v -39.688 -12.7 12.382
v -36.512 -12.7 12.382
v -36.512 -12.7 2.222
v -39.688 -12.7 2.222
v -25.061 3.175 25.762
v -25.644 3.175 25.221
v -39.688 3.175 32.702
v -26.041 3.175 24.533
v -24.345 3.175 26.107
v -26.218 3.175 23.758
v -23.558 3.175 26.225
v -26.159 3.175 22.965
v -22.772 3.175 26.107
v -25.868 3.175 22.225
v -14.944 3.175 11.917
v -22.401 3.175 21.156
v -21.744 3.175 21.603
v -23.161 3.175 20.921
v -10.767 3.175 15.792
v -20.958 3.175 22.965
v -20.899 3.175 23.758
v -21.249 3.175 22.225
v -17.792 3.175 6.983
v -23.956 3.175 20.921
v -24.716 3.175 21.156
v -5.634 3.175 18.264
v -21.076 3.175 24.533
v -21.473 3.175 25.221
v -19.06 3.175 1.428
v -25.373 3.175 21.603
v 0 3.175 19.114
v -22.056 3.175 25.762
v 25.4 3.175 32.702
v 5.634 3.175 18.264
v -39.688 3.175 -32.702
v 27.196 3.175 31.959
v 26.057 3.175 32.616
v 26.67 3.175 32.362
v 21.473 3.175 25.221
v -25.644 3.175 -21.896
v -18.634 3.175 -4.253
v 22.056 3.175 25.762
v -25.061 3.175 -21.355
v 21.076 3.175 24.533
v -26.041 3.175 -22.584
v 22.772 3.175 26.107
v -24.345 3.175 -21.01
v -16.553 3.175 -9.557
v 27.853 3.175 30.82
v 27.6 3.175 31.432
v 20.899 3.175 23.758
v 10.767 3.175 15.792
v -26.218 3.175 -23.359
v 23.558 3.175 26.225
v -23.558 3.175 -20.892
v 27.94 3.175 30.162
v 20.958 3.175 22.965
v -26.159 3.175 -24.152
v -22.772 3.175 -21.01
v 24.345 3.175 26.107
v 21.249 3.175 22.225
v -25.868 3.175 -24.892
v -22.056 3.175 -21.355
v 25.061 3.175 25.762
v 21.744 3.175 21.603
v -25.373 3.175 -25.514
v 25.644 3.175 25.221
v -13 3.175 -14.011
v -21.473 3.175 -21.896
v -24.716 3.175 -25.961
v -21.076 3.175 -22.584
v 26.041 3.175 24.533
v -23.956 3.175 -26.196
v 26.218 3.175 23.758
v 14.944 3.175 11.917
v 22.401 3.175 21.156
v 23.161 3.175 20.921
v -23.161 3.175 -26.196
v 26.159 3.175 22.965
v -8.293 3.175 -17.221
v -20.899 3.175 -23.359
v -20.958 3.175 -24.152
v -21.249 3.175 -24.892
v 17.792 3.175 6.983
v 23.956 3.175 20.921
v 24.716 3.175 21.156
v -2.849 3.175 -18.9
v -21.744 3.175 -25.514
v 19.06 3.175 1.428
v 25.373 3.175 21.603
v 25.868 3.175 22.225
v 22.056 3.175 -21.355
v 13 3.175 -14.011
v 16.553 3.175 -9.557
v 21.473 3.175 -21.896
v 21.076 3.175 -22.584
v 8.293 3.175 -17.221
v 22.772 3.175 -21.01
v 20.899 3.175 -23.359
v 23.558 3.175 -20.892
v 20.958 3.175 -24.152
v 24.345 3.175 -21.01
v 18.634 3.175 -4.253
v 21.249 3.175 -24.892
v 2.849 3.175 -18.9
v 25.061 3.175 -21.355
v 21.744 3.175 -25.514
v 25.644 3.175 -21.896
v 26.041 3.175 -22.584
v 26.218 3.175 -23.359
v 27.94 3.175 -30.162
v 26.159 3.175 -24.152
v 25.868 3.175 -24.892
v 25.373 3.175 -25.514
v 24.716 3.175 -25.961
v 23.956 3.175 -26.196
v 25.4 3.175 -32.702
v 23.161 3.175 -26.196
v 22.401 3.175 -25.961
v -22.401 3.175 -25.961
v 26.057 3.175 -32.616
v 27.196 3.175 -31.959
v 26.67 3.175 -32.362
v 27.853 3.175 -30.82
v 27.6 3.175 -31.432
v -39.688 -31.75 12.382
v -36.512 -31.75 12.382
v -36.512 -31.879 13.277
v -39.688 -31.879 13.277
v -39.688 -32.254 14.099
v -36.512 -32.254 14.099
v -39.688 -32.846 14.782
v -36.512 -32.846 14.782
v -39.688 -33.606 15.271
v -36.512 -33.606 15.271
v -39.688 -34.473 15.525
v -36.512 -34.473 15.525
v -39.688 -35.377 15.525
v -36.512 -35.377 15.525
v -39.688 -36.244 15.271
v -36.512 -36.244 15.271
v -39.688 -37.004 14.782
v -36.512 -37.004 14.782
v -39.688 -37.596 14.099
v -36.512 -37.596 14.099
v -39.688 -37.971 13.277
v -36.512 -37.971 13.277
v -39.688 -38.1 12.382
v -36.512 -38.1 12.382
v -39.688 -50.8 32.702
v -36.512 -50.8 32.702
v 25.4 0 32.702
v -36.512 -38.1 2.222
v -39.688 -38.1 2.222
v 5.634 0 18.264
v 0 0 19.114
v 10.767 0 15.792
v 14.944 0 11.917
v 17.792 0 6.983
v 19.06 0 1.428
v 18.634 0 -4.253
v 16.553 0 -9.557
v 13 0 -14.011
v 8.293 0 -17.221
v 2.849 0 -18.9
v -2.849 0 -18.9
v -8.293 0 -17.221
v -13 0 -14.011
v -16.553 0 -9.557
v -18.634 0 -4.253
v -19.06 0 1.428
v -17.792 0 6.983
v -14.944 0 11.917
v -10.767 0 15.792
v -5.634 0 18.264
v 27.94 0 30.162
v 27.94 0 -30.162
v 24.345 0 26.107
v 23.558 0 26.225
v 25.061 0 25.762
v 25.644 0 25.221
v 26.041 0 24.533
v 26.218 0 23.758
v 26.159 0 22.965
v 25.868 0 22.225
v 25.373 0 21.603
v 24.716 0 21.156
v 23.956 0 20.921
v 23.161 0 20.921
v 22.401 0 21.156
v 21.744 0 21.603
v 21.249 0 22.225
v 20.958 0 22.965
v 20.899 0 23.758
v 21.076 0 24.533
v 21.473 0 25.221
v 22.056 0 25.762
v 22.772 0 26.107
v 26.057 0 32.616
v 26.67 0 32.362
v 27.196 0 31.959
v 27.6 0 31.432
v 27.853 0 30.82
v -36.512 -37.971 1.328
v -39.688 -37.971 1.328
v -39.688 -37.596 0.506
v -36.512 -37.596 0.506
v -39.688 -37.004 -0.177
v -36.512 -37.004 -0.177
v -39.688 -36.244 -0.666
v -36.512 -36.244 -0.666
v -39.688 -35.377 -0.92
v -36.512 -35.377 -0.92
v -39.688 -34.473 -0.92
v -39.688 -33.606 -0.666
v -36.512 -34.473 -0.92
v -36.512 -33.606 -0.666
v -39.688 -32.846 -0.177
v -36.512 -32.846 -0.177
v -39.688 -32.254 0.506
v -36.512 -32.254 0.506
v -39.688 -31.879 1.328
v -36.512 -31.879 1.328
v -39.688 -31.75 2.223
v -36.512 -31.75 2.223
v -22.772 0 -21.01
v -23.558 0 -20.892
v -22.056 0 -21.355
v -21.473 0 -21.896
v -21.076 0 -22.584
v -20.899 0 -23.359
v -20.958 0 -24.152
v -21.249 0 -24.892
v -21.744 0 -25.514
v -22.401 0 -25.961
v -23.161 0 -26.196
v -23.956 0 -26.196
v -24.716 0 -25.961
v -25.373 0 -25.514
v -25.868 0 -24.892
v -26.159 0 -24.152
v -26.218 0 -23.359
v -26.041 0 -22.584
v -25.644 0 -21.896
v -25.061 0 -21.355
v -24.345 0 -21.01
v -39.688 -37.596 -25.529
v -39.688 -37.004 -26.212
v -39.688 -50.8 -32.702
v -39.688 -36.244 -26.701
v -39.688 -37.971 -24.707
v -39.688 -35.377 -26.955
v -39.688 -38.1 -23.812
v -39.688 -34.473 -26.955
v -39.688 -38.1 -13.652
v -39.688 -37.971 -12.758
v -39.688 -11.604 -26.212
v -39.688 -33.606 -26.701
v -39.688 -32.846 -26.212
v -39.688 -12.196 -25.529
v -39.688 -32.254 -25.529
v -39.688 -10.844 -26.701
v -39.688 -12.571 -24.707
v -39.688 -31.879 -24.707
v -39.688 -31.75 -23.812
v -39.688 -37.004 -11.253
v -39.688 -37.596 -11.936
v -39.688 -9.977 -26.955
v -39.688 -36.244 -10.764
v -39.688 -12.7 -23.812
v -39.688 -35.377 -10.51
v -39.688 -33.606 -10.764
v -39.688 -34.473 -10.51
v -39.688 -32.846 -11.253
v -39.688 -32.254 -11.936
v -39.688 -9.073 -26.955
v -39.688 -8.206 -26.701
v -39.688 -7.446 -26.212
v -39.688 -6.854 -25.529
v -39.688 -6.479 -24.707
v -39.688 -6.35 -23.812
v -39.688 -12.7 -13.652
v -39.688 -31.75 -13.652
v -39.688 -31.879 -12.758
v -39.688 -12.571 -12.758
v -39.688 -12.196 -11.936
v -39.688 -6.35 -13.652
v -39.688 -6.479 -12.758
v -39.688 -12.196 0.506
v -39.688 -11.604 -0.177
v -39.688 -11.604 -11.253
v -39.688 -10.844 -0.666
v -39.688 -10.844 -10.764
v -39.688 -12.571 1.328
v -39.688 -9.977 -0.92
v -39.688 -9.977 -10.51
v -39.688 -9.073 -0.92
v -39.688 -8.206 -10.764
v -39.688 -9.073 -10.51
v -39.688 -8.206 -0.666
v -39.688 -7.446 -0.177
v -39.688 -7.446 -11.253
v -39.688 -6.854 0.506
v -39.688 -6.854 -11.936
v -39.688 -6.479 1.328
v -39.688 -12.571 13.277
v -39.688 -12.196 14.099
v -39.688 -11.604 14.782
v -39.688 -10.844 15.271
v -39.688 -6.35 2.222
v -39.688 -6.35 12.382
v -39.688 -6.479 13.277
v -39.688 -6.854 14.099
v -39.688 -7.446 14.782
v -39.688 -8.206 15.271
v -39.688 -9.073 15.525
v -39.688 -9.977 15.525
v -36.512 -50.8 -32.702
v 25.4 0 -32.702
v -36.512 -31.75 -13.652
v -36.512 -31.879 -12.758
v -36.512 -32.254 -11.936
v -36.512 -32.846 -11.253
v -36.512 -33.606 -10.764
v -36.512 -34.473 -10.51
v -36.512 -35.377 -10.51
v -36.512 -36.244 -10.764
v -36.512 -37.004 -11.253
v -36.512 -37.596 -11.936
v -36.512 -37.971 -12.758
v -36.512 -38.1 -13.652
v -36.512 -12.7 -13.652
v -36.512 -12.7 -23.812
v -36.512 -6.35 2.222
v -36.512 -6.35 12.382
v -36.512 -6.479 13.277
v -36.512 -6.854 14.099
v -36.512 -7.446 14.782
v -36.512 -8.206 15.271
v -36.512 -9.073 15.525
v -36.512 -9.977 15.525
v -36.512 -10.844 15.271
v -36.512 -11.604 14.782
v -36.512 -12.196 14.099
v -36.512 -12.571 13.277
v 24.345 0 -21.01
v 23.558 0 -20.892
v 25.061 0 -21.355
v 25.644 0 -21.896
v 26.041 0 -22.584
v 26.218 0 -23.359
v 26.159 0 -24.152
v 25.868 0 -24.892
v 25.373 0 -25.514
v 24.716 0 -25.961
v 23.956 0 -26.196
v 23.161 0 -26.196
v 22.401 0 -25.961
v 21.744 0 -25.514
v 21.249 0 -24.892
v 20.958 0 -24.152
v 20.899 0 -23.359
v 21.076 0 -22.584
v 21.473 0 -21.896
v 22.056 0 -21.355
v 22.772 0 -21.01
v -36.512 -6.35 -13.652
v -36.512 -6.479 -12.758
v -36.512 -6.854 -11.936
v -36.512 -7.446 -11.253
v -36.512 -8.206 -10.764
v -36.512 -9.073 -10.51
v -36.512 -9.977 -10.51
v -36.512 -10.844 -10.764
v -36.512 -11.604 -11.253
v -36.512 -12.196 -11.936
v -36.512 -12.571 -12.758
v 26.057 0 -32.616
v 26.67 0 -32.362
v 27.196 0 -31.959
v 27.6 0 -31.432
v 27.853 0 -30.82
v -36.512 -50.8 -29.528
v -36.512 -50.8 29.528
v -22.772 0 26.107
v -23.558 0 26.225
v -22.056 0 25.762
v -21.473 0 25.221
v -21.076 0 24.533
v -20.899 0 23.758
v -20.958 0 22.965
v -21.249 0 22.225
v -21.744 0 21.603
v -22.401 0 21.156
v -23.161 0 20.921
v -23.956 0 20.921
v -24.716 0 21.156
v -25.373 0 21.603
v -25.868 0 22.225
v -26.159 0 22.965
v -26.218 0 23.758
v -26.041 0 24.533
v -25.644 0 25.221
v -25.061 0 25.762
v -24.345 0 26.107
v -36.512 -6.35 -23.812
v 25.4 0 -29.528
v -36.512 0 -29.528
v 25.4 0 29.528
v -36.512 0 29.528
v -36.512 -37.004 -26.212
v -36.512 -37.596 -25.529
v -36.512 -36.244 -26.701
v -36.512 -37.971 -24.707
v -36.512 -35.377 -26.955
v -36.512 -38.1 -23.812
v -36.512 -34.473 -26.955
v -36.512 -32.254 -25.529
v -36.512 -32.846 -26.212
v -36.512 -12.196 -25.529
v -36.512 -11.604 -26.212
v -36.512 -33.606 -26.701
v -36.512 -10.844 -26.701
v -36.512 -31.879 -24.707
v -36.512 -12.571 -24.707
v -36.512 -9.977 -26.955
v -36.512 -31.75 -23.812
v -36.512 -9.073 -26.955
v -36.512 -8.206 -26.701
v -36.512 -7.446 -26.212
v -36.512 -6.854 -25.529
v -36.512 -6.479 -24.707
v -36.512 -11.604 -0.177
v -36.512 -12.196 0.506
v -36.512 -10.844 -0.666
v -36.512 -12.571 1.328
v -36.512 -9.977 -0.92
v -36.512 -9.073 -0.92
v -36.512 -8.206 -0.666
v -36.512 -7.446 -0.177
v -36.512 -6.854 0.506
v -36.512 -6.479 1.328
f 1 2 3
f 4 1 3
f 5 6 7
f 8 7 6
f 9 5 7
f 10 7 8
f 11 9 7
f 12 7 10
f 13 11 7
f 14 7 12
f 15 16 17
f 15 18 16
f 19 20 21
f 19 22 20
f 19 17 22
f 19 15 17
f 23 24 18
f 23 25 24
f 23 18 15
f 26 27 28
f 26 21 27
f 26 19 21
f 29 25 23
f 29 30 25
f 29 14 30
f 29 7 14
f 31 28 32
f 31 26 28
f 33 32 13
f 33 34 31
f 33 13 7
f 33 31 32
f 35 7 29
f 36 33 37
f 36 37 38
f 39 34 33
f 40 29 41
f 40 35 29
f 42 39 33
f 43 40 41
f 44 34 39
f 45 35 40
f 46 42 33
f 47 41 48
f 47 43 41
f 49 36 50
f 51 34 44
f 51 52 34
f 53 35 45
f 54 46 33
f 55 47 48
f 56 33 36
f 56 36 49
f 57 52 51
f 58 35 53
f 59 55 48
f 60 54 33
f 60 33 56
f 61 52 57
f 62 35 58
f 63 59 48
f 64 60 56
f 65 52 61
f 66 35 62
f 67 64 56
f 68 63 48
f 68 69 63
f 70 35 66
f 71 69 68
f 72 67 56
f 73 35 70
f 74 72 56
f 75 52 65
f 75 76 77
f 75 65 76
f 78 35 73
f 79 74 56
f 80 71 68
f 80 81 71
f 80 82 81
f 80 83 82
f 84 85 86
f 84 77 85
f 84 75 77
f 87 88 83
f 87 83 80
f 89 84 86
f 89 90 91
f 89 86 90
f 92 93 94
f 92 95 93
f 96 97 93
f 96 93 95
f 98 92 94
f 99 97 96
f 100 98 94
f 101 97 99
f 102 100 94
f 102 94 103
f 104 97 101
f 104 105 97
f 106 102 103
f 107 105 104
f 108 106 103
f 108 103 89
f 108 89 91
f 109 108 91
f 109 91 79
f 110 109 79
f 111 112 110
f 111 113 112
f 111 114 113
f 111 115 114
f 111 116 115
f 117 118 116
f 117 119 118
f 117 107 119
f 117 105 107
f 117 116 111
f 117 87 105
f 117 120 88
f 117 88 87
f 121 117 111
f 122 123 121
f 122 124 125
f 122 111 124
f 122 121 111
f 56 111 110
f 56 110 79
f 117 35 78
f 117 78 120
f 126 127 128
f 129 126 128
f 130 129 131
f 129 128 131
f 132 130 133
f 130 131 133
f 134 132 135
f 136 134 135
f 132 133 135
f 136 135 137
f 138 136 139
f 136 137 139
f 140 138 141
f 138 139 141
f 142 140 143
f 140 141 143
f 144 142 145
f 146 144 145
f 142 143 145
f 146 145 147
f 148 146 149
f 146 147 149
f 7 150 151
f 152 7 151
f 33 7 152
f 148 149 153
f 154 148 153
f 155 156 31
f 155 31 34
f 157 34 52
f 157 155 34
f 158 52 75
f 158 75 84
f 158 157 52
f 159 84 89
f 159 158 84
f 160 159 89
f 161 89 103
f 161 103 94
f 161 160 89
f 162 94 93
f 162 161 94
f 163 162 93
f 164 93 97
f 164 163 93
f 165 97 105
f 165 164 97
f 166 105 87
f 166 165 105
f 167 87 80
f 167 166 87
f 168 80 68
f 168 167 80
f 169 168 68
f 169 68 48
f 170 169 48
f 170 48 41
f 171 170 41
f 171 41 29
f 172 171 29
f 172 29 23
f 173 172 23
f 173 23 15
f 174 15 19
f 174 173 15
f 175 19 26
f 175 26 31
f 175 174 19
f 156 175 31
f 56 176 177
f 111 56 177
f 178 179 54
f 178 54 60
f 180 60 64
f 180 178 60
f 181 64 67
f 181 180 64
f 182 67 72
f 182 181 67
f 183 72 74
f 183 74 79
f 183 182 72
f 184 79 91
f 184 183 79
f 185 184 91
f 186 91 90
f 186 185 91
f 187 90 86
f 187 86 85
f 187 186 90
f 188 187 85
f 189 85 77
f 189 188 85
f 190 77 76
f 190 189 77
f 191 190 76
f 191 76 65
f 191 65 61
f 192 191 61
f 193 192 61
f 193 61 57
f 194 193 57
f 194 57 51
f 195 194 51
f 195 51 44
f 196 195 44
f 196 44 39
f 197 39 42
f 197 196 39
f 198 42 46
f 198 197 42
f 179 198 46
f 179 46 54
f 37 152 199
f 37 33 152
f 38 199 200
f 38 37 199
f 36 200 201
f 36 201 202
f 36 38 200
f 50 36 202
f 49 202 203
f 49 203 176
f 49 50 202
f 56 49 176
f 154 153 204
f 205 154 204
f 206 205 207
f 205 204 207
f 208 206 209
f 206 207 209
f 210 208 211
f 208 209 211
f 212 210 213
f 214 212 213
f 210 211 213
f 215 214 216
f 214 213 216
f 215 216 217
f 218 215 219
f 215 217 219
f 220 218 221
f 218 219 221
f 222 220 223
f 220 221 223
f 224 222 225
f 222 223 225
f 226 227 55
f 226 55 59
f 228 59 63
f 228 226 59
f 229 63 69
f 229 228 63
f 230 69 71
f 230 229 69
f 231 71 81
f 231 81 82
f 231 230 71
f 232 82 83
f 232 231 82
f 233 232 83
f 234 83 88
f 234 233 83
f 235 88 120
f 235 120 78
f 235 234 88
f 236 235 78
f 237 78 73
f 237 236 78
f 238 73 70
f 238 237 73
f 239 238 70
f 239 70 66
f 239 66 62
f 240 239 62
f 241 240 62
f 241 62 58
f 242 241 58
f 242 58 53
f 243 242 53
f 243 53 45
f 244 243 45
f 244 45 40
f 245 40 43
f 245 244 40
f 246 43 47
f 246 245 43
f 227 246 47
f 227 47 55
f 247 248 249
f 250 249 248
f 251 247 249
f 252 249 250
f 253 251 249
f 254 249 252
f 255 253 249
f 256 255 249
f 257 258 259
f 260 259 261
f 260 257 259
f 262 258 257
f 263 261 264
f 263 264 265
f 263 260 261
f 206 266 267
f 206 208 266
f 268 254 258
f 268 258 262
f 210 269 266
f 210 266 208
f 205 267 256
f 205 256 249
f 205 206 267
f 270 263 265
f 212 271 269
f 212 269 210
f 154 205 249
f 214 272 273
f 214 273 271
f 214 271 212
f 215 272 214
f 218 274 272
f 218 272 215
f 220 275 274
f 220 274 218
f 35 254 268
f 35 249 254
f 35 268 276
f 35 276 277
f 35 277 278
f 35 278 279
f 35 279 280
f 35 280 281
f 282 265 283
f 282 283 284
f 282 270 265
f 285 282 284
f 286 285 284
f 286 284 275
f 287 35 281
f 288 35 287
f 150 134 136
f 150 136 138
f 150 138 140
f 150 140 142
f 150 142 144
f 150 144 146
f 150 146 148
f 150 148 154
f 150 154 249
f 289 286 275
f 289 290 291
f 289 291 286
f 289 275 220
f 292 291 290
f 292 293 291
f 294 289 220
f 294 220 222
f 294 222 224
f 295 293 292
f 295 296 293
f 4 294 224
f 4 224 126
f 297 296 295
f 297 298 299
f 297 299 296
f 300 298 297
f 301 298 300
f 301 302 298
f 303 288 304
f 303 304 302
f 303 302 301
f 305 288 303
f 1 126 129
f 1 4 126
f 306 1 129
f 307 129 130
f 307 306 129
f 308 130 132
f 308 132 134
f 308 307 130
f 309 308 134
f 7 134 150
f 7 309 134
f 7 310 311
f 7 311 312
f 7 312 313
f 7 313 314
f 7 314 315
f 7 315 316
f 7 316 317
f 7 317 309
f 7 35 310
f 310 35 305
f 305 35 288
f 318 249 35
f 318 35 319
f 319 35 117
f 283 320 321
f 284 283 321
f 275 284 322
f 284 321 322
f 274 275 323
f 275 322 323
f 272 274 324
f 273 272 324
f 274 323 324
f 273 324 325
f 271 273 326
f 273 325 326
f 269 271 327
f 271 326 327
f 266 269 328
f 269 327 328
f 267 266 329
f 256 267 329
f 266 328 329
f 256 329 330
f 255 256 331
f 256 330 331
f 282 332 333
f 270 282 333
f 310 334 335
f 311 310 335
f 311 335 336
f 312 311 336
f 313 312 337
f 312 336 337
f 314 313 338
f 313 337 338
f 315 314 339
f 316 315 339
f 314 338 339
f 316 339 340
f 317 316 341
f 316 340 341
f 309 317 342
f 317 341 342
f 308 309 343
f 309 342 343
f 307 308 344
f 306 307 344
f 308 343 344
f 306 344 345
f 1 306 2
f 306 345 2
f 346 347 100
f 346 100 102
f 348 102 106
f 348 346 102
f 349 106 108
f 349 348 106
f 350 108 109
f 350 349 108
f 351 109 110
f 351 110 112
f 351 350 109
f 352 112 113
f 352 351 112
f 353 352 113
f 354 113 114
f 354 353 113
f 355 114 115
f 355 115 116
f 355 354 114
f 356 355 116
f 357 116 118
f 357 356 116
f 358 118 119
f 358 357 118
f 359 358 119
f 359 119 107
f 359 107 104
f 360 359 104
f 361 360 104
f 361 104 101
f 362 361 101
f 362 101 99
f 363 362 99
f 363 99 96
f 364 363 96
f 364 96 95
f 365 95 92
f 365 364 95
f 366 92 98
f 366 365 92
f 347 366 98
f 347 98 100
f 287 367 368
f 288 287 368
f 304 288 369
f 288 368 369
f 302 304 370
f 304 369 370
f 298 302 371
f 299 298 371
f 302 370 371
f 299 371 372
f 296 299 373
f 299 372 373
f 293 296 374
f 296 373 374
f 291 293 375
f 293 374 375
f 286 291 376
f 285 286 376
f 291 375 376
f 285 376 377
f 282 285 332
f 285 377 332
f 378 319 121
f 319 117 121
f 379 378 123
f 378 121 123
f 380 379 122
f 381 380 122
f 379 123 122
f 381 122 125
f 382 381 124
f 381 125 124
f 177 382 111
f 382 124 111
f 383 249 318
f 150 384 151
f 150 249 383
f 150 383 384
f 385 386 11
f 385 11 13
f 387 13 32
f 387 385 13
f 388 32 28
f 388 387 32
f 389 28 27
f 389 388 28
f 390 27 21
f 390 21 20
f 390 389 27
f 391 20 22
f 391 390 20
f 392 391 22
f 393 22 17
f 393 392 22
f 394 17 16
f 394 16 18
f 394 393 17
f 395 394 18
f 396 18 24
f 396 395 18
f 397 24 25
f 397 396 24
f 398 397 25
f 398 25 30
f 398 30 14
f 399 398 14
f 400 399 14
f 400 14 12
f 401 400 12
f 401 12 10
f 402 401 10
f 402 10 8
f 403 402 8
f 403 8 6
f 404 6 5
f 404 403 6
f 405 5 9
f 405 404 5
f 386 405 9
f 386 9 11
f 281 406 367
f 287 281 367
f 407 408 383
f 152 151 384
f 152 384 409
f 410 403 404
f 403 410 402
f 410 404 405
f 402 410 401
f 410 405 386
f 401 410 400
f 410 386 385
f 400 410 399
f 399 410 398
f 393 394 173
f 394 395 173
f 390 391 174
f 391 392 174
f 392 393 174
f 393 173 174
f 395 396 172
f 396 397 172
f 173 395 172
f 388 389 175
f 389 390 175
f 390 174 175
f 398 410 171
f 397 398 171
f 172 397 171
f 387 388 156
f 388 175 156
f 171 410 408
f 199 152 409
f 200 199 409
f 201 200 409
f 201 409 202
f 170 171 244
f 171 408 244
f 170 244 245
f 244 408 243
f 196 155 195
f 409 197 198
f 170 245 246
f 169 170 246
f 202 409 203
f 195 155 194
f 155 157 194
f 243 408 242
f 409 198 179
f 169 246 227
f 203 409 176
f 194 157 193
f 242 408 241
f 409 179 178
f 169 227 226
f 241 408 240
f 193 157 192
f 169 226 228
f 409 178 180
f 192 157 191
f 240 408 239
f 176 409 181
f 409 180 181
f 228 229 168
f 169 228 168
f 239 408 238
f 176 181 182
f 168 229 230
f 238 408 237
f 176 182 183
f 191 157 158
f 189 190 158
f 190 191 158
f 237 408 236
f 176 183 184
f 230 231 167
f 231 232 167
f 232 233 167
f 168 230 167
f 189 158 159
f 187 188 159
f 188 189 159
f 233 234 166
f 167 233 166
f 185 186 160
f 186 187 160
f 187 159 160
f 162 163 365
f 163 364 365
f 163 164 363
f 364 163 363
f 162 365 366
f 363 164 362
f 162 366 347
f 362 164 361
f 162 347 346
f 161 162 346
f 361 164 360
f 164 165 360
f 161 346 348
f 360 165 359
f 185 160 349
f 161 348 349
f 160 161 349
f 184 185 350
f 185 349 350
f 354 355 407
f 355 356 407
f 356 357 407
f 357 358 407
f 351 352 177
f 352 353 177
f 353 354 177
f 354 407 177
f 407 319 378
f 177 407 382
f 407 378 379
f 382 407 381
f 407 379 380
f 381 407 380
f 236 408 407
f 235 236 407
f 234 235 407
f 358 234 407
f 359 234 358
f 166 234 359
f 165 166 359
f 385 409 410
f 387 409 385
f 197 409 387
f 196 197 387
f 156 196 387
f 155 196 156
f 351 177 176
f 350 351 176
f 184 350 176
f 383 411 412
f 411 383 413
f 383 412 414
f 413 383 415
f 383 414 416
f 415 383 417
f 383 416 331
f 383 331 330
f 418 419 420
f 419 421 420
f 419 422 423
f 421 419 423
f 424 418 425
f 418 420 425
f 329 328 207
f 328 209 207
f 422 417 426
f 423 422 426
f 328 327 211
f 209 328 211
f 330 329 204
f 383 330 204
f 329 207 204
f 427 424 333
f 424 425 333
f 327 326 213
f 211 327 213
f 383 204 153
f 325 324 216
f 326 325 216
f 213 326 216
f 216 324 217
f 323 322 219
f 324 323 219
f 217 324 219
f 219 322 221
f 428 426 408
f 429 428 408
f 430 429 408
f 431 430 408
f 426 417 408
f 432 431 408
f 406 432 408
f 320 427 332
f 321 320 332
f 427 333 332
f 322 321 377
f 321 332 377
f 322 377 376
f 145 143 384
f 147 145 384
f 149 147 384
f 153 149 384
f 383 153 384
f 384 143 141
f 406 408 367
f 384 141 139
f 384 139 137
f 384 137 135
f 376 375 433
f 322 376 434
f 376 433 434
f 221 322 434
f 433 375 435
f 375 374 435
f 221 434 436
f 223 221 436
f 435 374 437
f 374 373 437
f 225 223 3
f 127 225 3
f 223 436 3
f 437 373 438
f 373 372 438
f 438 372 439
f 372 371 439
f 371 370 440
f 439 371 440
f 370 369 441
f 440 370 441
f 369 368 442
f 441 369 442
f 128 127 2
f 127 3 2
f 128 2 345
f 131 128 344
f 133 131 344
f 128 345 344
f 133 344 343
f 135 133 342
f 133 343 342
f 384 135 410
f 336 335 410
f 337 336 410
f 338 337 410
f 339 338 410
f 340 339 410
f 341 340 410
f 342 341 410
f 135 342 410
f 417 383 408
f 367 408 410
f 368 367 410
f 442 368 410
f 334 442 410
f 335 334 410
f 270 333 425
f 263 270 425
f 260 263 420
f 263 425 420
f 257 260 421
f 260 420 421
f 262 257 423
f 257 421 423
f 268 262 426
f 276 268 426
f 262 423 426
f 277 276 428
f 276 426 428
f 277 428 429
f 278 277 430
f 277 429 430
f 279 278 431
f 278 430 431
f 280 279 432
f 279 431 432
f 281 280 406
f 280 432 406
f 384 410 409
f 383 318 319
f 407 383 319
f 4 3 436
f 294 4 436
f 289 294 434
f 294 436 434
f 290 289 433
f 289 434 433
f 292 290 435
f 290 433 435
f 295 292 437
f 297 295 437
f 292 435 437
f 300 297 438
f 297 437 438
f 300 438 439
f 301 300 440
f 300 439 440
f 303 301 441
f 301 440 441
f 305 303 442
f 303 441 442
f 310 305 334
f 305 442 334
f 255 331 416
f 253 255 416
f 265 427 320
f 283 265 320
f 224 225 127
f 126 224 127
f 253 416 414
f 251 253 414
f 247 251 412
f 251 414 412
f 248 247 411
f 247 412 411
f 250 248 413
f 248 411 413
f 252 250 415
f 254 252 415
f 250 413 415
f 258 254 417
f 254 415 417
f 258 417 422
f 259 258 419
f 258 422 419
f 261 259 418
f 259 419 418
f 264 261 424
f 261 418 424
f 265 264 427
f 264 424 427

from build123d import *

# Parameters (mm, degrees)
SKETCH1_W           = 67.6275
SKETCH1_H           = 65.405
SKETCH1_R           = 19.1135
SKETCH1_R_2         = 2.667
BOSS_EXTRUDE1_DEPTH = 3.175
FILLET1_R           = 2.54
SKETCH2_W           = 65.405
SKETCH2_H           = 50.8
BOSS_EXTRUDE2_DEPTH = 3.175
BOSS_EXTRUDE5_DEPTH = 3.175
BOSS_EXTRUDE6_DEPTH = 3.175
SKETCH9_R           = 3.175
CUT_EXTRUDE1_DEPTH  = 3.175


with BuildPart() as part:
    # Sketch1 → Boss-Extrude1 (new body)
    with BuildSketch(Plane(origin=(0, 0, 0), x_dir=(1, 0, 0), z_dir=(0, 1, 0))):
        with Locations((-5.87375, 0)):
            Rectangle(SKETCH1_W, SKETCH1_H)
        with Locations(Location((0, 0, 0), (0, 0, 270))):
            Circle(SKETCH1_R, mode=Mode.SUBTRACT)
        with Locations(Location((-23.5585, 23.5585, 0), (0, 0, 270))):
            Circle(SKETCH1_R_2, mode=Mode.SUBTRACT)
        with Locations(Location((23.5585, 23.5585, 0), (0, 0, 270))):
            Circle(SKETCH1_R_2, mode=Mode.SUBTRACT)
        with Locations(Location((-23.5585, -23.5585, 0), (0, 0, 270))):
            Circle(SKETCH1_R_2, mode=Mode.SUBTRACT)
        with Locations(Location((23.5585, -23.5585, 0), (0, 0, 270))):
            Circle(SKETCH1_R_2, mode=Mode.SUBTRACT)
    extrude(amount=BOSS_EXTRUDE1_DEPTH)

    # Fillet1
    fillet1_edges = [part.edges().sort_by_distance(p)[0] for p in [
        (27.94, 1.5875, -32.7025),
        (27.94, 1.5875, 32.7025),
    ]]
    fillet(fillet1_edges, radius=FILLET1_R)

    # Sketch2 → Boss-Extrude2 (add)
    with BuildSketch(Plane.ZY.offset(39.6875)):
        with Locations((0, -25.4)):
            Rectangle(SKETCH2_W, SKETCH2_H)
    extrude(amount=-BOSS_EXTRUDE2_DEPTH)

    # Sketch7 → Boss-Extrude5 (add)
    with BuildSketch(Plane.XY.offset(32.7025)):
        Polygon((-36.5125, -50.8), (25.4, 0), (-36.5125, 0), align=None)
    extrude(amount=-BOSS_EXTRUDE5_DEPTH)

    # Sketch8 → Boss-Extrude6 (add)
    with BuildSketch(Plane(origin=(0, 0, -32.7025), x_dir=(-1, 0, 0), z_dir=(0, 0, -1))):
        Polygon((-25.4, 0), (36.5125, 0), (36.5125, -50.8), align=None)
    extrude(amount=-BOSS_EXTRUDE6_DEPTH)

    # Sketch9 → Cut-Extrude1 (cut)
    with BuildSketch(Plane(origin=(-36.5125, 0, 0), x_dir=(0, 0, -1), z_dir=(1, 0, 0))):
        with BuildLine():
            ThreePointArc((-2.2225, -12.7), (-5.3975, -9.525), (-2.2225, -6.35))
            Line((-2.2225, -6.35), (-12.3825, -6.35))
            ThreePointArc((-12.3825, -6.35), (-10.13743597, -7.27993597), (-9.2075, -9.525))
            ThreePointArc((-9.2075, -9.525), (-10.13743597, -11.77006403), (-12.3825, -12.7))
            Line((-12.3825, -12.7), (-2.2225, -12.7))
        make_face()
        with Locations((-2.2225, -9.525)):
            Circle(SKETCH9_R)
        with Locations((-12.3825, -9.525)):
            Circle(SKETCH9_R)
        with BuildLine():
            ThreePointArc((23.8125, -12.7), (20.6375, -9.525), (23.8125, -6.35))
            Line((23.8125, -6.35), (13.6525, -6.35))
            ThreePointArc((13.6525, -6.35), (15.89756403, -7.27993597), (16.8275, -9.525))
            ThreePointArc((16.8275, -9.525), (15.89756403, -11.77006403), (13.6525, -12.7))
            Line((13.6525, -12.7), (23.8125, -12.7))
        make_face()
        with Locations((13.6525, -9.525)):
            Circle(SKETCH9_R)
        with Locations((23.8125, -9.525)):
            Circle(SKETCH9_R)
        with Locations((23.8125, -34.925)):
            Circle(SKETCH9_R)
        with BuildLine():
            Line((13.6525, -38.1), (23.8125, -38.1))
            ThreePointArc((23.8125, -38.1), (20.6375, -34.925), (23.8125, -31.75))
            Line((23.8125, -31.75), (13.6525, -31.75))
            ThreePointArc((13.6525, -31.75), (15.89756403, -32.67993597), (16.8275, -34.925))
            ThreePointArc((16.8275, -34.925), (15.89756403, -37.17006403), (13.6525, -38.1))
        make_face()
        with Locations((13.6525, -34.925)):
            Circle(SKETCH9_R)
        with Locations((-2.2225, -34.925)):
            Circle(SKETCH9_R)
        with BuildLine():
            ThreePointArc((-2.2225, -38.1), (-5.3975, -34.925), (-2.2225, -31.75))
            Line((-2.2225, -31.75), (-12.3825, -31.75))
            ThreePointArc((-12.3825, -31.75), (-10.13743597, -32.67993597), (-9.2075, -34.925))
            ThreePointArc((-9.2075, -34.925), (-10.13743597, -37.17006403), (-12.3825, -38.1))
            Line((-12.3825, -38.1), (-2.2225, -38.1))
        make_face()
        with Locations((-12.3825, -34.925)):
            Circle(SKETCH9_R)
    extrude(amount=-CUT_EXTRUDE1_DEPTH, mode=Mode.SUBTRACT)


solid = part.part
